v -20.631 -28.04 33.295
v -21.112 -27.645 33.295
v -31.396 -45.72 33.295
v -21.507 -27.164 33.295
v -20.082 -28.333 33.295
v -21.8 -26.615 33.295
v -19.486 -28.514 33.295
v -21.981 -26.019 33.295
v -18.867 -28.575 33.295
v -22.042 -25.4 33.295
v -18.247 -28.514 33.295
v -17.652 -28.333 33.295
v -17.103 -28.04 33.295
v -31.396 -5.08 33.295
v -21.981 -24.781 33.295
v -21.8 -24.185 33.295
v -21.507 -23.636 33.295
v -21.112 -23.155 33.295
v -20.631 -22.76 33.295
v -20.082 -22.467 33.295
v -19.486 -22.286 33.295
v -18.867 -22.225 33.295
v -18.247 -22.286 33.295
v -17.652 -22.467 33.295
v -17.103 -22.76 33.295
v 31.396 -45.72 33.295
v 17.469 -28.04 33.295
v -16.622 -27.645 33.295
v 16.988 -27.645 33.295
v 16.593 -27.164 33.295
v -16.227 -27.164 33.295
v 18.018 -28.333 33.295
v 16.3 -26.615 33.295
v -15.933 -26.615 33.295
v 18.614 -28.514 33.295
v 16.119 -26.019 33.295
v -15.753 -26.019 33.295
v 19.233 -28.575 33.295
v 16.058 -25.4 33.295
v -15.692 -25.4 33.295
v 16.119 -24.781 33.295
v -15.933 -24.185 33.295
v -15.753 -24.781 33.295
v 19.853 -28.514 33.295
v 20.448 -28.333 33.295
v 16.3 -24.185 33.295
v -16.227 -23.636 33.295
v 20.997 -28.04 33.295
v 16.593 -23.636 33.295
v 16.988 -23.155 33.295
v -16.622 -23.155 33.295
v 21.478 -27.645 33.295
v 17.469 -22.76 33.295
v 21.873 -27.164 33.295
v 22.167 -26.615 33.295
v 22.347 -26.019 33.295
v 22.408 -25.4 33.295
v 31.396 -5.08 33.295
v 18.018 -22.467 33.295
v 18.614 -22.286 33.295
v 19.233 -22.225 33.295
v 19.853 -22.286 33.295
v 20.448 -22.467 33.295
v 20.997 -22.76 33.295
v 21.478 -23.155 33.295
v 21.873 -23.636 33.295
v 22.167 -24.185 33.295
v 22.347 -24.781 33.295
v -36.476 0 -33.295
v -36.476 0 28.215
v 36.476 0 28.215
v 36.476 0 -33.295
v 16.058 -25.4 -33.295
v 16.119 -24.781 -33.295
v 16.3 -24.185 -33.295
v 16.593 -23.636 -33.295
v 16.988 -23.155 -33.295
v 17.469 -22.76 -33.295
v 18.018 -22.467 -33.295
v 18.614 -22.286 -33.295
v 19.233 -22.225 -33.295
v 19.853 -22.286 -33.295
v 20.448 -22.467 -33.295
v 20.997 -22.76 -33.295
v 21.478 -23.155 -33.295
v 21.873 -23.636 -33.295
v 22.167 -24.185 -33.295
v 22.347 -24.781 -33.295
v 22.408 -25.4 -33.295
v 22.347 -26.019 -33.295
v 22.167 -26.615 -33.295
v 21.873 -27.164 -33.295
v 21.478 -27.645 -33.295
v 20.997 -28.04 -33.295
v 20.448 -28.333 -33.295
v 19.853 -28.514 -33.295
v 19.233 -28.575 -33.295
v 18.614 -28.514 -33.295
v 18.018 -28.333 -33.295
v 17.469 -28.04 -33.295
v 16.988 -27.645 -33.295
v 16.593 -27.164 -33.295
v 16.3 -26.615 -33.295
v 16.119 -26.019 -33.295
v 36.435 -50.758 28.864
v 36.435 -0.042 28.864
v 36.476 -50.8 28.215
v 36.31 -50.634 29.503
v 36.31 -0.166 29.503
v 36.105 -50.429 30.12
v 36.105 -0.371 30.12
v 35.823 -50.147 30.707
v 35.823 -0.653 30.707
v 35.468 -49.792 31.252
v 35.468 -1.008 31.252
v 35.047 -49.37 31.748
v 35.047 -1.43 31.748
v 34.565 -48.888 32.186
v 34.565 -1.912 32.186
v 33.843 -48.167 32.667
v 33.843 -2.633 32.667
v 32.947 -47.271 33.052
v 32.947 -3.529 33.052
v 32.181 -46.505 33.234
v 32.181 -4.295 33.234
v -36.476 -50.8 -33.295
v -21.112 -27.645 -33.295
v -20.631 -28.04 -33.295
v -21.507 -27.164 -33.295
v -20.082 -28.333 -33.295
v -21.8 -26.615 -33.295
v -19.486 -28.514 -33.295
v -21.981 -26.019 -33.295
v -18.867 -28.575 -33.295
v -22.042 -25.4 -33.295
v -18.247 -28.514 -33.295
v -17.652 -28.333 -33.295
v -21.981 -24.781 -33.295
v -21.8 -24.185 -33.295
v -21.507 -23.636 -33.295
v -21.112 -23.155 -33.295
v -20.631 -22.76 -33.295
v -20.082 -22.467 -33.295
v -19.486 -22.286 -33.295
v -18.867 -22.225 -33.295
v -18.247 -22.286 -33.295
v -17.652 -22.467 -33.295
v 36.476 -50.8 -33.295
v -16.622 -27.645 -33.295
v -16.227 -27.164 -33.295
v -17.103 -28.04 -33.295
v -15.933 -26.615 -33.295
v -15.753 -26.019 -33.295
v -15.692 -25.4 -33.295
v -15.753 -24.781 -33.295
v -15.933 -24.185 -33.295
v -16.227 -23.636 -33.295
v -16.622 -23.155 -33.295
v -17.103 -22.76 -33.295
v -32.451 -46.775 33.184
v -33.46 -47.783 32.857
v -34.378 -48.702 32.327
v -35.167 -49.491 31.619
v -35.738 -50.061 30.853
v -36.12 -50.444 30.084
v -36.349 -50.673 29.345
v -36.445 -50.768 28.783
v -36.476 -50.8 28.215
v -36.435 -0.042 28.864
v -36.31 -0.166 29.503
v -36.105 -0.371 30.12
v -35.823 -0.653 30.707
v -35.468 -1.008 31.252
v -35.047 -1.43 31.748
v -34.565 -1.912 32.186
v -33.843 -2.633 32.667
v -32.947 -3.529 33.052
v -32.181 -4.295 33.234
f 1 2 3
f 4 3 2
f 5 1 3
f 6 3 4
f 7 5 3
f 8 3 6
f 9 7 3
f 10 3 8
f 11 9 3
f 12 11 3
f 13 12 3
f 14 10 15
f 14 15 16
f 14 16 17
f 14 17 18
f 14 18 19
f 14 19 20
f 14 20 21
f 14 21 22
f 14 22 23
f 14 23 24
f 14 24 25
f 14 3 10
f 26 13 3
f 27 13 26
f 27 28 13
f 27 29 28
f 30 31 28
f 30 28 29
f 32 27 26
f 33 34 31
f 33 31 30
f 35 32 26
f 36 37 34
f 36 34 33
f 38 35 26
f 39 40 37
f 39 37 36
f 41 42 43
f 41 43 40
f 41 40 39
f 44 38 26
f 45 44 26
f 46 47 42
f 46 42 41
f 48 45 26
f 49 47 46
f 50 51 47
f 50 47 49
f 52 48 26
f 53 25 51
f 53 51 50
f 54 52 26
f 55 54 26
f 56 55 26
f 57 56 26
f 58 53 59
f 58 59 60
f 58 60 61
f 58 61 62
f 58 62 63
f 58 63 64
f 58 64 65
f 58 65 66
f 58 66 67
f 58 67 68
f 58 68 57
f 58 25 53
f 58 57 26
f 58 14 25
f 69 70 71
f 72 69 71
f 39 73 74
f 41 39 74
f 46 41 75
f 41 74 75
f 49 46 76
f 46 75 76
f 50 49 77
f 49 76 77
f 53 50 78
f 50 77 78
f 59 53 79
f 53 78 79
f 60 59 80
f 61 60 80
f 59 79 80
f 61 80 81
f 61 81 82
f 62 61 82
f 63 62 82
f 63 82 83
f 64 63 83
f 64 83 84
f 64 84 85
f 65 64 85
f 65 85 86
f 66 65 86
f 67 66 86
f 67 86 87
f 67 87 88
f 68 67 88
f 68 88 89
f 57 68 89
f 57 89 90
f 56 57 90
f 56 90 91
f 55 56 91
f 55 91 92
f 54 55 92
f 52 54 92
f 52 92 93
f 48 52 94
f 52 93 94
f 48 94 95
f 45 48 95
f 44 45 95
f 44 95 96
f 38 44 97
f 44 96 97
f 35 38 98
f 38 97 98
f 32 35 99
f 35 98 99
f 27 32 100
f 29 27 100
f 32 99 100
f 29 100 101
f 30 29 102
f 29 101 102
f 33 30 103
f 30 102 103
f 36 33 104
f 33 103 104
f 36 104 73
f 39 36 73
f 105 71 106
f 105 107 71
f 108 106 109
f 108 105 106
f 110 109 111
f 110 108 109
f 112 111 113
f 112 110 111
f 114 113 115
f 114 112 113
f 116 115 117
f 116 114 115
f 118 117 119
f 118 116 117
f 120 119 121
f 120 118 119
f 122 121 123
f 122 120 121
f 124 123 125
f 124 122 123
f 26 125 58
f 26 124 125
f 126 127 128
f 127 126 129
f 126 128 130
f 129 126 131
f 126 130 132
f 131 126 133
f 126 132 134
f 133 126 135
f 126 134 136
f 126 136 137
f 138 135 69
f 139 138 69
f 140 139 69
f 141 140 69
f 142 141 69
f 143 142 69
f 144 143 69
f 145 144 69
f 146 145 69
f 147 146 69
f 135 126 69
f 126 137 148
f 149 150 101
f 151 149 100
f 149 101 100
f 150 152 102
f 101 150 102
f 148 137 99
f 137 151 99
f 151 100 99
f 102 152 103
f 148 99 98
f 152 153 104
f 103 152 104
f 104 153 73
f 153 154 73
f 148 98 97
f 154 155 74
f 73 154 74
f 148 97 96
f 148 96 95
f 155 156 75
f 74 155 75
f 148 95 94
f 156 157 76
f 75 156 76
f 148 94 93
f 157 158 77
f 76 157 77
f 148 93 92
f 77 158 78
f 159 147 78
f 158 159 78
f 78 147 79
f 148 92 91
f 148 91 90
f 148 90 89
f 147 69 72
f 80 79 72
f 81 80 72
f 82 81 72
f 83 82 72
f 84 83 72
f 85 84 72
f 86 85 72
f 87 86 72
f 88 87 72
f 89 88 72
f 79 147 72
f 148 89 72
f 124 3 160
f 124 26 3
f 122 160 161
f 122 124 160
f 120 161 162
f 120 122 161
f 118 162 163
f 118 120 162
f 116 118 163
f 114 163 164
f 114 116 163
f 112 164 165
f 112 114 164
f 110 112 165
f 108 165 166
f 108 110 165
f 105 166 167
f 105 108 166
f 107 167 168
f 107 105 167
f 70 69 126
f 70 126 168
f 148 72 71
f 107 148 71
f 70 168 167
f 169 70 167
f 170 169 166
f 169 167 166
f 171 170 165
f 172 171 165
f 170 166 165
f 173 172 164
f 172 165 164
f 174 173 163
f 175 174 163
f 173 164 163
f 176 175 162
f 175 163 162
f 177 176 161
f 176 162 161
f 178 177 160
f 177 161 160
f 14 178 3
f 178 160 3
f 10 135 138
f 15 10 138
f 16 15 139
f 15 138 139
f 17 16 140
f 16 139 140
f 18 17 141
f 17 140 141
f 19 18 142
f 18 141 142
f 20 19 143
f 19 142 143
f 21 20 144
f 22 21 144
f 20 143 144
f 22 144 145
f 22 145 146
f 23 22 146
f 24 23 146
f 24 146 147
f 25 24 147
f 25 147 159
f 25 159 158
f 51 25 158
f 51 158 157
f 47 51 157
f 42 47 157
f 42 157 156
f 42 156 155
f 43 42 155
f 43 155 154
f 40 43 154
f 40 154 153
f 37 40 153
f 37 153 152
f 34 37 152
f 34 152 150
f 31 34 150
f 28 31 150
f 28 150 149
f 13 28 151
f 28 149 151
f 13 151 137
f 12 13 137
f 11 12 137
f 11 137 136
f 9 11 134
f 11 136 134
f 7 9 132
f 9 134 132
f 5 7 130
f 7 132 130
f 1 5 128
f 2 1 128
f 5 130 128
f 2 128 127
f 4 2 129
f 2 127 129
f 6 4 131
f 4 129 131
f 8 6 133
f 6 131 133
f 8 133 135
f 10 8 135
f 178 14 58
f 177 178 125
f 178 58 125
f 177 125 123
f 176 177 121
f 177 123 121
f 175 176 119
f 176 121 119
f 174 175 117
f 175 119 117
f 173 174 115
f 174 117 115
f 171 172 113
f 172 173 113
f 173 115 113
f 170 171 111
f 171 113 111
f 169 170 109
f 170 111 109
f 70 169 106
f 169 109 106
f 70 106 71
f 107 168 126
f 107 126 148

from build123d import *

# Parameters (mm, degrees)
F0_W     = 72.952986
F0_H     = 66.589336
F1_DEPTH = 50.8
F2_R     = 5.08
F4_D     = 6.35


with BuildPart() as f1:
    # F0 (on Front) → F1 (new body)
    with BuildSketch(Plane.XZ):
        Rectangle(F0_W, F0_H)
    extrude(amount=F1_DEPTH)

    # F2
    f2_edges = [f1.edges().sort_by_distance(p)[0] for p in [
        (36.476493, -25.4, 33.294668),
        (0, -50.8, 33.294668),
        (-36.476493, -25.4, 33.294668),
        (0, 0, 33.294668),
    ]]
    fillet(f2_edges, radius=F2_R)

    # F4 (through all)
    with Locations(Plane.XY.offset(33.294668)):
        with Locations((-18.866701, -25.4), (19.233299, -25.4)):
            Hole(F4_D / 2)


solid = f1.part
